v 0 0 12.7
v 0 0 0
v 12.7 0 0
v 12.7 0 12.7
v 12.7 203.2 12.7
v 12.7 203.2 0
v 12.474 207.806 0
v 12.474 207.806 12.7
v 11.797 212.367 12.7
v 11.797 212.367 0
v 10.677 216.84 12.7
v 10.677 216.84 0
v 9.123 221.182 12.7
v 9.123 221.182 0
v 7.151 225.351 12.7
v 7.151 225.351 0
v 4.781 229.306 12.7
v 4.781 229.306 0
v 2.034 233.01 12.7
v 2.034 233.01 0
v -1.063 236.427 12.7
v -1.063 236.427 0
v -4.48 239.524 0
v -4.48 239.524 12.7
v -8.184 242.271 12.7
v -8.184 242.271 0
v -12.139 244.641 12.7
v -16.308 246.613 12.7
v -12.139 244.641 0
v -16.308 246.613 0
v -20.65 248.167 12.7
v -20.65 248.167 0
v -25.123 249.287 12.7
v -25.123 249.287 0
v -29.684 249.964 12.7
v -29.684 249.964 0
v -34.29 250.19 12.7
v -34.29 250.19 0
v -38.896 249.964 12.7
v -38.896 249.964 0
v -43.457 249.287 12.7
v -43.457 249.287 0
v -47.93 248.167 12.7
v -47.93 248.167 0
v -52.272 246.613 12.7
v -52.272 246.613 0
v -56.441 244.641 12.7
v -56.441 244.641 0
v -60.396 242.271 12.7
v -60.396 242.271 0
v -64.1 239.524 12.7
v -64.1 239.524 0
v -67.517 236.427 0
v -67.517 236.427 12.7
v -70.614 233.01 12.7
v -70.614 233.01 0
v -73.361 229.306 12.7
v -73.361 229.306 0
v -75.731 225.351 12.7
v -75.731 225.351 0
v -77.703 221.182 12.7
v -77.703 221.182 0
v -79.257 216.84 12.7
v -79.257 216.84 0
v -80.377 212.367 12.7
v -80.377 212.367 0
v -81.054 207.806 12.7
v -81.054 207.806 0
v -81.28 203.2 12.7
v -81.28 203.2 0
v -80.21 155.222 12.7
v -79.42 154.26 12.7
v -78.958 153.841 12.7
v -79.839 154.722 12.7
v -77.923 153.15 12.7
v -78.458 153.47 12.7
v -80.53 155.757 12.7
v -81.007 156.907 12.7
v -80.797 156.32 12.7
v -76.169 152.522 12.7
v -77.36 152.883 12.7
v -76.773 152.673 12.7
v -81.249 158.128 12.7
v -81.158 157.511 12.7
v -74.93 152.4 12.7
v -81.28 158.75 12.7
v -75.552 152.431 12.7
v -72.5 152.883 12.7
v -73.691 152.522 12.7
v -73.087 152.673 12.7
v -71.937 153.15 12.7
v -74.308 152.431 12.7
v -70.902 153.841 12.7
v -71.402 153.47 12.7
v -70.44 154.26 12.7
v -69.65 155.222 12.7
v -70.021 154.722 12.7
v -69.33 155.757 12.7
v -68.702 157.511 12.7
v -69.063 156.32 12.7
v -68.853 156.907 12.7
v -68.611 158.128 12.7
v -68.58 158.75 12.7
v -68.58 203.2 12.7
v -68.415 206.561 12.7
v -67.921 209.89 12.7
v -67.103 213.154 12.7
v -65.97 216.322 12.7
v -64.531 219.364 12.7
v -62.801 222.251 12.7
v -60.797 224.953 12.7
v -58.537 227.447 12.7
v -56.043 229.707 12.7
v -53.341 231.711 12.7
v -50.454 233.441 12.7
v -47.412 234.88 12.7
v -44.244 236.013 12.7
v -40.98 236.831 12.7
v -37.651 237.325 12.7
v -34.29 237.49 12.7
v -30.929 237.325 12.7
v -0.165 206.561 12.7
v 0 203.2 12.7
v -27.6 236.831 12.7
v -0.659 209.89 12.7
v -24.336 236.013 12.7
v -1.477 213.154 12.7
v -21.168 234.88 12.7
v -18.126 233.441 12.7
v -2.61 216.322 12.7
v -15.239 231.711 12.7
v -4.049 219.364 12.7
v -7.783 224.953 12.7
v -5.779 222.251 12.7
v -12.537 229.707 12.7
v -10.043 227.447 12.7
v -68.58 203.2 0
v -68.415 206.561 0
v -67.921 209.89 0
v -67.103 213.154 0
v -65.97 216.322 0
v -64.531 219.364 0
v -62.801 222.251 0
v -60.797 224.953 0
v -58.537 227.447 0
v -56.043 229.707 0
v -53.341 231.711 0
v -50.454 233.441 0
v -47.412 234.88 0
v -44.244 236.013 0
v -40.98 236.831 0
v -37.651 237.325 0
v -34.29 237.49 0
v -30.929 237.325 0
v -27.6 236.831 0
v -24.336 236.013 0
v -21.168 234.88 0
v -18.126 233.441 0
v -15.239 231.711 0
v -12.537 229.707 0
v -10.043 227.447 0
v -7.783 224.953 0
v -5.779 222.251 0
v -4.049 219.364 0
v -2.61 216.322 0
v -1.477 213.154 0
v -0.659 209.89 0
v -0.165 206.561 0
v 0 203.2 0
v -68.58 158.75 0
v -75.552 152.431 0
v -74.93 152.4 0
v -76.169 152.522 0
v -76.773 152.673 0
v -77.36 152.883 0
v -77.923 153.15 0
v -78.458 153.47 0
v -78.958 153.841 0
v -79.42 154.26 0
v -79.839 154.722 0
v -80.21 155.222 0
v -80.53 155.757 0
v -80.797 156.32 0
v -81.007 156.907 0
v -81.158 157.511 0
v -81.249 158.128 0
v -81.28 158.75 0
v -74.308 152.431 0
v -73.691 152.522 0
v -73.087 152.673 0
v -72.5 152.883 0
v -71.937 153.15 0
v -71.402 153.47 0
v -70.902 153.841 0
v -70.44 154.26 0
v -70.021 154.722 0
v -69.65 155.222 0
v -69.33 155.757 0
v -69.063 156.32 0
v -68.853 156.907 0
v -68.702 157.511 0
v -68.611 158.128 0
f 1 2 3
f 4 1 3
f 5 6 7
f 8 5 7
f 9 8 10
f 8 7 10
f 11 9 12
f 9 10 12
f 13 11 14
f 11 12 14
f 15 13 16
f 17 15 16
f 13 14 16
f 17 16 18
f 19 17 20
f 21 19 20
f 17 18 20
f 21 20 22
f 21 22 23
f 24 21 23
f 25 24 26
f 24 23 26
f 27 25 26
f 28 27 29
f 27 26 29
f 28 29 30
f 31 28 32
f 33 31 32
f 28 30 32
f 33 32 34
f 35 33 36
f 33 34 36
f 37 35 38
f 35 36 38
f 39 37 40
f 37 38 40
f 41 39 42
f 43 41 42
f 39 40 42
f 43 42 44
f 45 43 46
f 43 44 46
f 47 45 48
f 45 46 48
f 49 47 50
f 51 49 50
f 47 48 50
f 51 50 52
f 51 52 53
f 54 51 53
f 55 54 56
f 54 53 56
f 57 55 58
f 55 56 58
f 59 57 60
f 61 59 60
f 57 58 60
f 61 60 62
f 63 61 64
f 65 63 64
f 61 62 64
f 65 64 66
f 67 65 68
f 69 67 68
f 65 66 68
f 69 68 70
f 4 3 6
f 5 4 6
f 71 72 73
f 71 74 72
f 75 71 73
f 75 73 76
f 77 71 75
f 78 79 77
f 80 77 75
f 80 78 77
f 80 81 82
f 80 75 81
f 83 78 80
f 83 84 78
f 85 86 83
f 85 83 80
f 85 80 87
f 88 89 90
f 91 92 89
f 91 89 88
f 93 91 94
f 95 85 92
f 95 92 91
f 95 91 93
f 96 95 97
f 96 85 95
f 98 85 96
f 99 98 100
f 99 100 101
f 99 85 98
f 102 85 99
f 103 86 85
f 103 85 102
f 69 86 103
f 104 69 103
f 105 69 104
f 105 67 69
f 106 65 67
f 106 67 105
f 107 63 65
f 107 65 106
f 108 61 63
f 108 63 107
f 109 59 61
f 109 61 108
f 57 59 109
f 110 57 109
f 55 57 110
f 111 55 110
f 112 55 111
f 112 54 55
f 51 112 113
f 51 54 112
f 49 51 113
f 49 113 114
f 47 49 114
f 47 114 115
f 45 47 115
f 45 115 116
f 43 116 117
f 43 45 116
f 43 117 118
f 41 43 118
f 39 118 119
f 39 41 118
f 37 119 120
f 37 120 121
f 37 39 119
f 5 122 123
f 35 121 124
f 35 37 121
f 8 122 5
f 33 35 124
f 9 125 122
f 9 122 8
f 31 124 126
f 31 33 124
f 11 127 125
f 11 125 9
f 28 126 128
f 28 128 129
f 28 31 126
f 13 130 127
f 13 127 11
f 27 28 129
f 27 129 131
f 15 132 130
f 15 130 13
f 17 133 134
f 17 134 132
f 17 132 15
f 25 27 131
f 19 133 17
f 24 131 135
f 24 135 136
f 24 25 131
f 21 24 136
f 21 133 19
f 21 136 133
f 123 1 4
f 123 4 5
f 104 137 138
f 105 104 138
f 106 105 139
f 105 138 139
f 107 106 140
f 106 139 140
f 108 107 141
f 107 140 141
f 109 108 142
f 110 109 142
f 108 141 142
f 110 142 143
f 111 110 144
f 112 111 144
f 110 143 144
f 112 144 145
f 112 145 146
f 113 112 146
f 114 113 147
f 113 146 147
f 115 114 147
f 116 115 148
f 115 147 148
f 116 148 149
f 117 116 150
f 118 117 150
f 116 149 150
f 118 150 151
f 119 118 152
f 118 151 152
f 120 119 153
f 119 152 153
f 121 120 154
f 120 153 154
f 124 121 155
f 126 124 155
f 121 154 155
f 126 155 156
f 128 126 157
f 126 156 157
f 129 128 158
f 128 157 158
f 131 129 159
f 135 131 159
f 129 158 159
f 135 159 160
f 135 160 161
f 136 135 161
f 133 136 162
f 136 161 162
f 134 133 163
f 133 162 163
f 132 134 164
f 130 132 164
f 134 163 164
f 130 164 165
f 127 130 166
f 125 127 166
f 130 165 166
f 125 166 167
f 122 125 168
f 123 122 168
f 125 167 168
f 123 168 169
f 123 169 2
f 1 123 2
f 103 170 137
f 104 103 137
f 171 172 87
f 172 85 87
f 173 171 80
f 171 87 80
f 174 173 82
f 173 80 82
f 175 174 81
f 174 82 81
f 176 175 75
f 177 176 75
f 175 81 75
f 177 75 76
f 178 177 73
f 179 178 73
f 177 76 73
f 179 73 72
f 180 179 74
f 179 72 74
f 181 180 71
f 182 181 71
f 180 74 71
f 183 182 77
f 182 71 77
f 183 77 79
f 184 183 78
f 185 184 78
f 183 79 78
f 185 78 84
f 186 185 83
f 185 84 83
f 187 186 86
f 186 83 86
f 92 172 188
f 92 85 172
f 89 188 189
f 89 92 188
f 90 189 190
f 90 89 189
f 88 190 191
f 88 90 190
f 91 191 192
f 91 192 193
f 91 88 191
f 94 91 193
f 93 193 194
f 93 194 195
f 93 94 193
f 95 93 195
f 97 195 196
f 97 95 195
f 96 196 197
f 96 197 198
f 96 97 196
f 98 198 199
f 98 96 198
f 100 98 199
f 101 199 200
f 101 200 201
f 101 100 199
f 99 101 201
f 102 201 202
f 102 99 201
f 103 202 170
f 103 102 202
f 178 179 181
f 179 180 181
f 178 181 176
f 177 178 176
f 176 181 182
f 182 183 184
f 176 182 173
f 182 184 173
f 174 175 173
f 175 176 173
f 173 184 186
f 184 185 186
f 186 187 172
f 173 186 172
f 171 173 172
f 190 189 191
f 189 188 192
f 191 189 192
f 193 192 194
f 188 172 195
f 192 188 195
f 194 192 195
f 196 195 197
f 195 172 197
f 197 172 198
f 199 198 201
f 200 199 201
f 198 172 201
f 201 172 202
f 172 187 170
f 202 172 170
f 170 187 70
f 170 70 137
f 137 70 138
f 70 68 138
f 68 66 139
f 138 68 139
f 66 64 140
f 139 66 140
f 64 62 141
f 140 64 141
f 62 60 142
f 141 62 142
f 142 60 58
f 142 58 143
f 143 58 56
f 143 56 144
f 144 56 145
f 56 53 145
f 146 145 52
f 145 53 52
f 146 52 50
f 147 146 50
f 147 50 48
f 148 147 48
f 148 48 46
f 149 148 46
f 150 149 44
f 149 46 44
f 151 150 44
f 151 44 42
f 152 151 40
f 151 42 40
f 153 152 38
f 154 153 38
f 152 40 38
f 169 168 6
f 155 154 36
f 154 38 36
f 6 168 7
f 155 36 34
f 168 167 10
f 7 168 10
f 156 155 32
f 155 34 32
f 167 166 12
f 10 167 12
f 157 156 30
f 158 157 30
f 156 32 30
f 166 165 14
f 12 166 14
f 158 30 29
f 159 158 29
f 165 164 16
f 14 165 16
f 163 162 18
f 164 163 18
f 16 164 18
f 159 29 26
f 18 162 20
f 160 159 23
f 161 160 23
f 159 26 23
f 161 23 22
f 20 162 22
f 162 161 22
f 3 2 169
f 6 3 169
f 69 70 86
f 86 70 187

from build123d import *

# Parameters (mm, degrees)
BOSS_EXTRUDE1_DEPTH = 12.7
FILLET3_R           = 6.35
FILLET4_R           = 6.35


with BuildPart() as part:
    # Sketch5 → Boss-Extrude1 (new body)
    with BuildSketch(Plane.XY):
        with BuildLine():
            Line((0, 0), (12.7, 0))
            Line((12.7, 0), (12.7, 203.2))
            ThreePointArc((12.7, 203.2), (-34.29, 250.19), (-81.28, 203.2))
            Line((-81.28, 203.2), (-81.28, 152.4))
            Line((-81.28, 152.4), (-68.58, 152.4))
            Line((-68.58, 152.4), (-68.58, 203.2))
            ThreePointArc((-68.58, 203.2), (-34.29, 237.49), (0, 203.2))
            Line((0, 203.2), (0, 0))
        make_face()
    extrude(amount=BOSS_EXTRUDE1_DEPTH)

    # Fillet3
    fillet3_edges = [part.edges().sort_by_distance(p)[0] for p in [
        (-68.58, 152.4, 6.35),
    ]]
    fillet(fillet3_edges, radius=FILLET3_R)

    # Fillet4
    fillet4_edges = [part.edges().sort_by_distance(p)[0] for p in [
        (-81.28, 152.4, 6.35),
    ]]
    fillet(fillet4_edges, radius=FILLET4_R - 0.0001)  # a hair under: the kernel refuses the full size


solid = part.part
